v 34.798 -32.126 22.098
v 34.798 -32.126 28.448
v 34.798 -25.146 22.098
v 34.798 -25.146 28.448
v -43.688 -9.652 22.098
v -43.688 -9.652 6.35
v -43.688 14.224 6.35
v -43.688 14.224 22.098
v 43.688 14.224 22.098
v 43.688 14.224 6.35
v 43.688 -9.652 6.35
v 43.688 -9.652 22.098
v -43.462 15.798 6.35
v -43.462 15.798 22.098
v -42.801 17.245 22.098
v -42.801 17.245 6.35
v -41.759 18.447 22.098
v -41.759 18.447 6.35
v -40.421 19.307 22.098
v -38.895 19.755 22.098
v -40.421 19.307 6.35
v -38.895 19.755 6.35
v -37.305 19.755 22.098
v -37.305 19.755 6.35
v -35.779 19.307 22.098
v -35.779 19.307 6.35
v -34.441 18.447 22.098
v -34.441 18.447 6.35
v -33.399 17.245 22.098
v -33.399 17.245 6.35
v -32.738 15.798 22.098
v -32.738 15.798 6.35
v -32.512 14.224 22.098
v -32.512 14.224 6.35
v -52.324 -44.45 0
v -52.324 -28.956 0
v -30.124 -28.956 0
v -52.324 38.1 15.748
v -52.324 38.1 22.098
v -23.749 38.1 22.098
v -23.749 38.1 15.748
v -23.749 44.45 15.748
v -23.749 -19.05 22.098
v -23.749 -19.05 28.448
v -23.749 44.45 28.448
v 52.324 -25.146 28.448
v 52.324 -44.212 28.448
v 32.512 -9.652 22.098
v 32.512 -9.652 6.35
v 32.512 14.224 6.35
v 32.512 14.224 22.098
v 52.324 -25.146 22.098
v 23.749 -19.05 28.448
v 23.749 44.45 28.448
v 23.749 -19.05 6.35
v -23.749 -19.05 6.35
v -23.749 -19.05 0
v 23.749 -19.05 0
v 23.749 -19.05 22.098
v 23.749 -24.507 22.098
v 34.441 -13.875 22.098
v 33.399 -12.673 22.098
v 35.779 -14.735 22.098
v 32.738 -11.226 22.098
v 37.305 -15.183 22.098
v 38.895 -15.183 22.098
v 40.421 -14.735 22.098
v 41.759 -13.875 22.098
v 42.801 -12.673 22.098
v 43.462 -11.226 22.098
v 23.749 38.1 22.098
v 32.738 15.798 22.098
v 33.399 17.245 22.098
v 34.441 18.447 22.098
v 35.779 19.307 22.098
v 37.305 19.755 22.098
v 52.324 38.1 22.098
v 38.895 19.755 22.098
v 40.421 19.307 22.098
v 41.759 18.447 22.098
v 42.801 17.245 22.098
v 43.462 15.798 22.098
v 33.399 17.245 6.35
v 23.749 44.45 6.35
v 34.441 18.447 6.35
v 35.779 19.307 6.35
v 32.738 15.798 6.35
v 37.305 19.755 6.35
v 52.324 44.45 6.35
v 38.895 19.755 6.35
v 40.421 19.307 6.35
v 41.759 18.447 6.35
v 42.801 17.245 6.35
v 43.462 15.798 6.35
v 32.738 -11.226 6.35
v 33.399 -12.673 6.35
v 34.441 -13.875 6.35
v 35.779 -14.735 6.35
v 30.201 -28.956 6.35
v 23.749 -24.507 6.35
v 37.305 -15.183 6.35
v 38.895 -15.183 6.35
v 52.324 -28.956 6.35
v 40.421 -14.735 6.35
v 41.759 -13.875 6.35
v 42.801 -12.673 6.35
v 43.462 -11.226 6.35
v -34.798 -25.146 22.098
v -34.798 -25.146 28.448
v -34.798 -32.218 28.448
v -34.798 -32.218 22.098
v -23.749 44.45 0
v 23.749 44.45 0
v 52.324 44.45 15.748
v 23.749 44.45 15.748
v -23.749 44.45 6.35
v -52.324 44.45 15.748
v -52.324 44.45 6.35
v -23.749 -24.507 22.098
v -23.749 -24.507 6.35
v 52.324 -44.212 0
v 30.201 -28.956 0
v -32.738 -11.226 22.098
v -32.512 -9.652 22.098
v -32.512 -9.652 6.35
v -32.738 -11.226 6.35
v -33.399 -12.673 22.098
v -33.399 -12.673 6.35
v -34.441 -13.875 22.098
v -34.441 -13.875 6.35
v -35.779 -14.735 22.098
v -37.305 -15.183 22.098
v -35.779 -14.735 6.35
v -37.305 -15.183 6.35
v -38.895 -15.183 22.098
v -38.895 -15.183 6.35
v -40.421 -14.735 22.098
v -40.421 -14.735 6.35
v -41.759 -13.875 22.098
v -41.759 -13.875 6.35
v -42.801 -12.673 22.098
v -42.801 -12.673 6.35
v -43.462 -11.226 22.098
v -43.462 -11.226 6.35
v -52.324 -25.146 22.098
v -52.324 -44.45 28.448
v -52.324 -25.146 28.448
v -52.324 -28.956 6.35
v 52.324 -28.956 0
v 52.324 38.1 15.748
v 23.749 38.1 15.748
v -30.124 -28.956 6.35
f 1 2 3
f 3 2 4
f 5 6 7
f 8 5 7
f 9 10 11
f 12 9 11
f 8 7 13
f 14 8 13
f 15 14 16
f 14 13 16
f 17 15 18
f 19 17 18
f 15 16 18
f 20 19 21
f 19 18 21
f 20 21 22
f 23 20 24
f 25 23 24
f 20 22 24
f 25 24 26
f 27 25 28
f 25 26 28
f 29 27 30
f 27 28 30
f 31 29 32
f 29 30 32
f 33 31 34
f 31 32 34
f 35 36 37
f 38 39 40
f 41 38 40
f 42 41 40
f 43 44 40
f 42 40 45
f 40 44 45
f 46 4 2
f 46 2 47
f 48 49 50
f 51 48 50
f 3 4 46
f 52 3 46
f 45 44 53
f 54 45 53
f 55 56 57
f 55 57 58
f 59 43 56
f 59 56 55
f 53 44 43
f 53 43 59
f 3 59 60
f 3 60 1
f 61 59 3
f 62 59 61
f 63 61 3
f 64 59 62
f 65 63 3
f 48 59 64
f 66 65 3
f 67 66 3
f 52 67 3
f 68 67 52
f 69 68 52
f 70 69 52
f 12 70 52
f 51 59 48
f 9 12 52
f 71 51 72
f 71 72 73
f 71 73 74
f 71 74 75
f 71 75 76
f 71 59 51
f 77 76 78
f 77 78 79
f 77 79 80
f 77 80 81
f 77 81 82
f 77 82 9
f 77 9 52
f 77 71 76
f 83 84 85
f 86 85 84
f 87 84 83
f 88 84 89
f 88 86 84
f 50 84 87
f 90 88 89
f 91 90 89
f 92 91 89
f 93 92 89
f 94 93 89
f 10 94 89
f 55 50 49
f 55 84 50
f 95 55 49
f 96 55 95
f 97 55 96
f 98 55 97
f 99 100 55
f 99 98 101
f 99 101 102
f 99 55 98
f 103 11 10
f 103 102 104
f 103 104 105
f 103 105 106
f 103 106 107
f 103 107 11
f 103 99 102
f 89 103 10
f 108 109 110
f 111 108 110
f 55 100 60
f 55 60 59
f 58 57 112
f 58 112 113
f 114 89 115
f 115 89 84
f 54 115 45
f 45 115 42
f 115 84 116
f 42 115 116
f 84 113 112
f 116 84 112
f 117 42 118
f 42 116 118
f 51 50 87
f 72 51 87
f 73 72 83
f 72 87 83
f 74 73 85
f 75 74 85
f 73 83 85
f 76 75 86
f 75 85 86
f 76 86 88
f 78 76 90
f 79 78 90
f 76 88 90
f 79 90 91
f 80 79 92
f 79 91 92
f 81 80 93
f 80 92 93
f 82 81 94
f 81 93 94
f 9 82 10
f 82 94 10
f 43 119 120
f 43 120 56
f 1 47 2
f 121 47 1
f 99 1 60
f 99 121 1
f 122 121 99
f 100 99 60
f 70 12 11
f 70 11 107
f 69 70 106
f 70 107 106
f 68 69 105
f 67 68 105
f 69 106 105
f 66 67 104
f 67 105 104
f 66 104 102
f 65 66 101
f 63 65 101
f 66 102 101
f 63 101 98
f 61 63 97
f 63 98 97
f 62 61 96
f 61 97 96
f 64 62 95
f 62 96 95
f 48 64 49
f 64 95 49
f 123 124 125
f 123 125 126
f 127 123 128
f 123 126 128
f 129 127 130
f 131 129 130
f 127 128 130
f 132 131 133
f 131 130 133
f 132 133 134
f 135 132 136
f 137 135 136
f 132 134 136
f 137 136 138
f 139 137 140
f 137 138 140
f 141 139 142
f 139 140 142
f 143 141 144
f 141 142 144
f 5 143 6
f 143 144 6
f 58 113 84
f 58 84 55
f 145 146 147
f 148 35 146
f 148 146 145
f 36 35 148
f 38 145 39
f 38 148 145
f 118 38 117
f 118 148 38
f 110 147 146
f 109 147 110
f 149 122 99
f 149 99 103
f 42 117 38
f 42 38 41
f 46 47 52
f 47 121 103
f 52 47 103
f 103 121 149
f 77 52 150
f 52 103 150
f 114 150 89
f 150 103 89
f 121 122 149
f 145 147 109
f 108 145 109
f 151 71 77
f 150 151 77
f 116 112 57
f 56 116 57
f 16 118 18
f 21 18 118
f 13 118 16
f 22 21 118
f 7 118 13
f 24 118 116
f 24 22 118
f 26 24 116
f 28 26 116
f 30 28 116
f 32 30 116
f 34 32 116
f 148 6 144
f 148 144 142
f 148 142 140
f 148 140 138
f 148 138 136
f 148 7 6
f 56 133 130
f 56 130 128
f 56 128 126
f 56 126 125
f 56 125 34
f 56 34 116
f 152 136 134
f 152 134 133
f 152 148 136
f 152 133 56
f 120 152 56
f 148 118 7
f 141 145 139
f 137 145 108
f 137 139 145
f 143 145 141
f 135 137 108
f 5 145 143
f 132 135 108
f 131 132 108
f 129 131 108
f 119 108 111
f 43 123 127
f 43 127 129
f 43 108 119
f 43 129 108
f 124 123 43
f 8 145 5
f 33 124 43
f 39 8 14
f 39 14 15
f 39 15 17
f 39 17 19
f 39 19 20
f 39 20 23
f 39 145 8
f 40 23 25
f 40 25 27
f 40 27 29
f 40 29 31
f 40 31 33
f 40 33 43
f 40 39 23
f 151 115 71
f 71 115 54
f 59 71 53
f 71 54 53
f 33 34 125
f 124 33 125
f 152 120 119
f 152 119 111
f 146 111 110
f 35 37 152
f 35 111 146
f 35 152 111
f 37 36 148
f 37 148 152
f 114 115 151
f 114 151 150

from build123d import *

# Parameters (mm, degrees)
F0_W      = 28.575
F0_H      = 88.9
F0_W_2    = 47.498
F1_DEPTH  = 28.448
F2_DEPTH  = 25.4
F3_W      = 28.575
F3_H      = 73.406
F4_DEPTH  = 6.35
F5_W      = 28.575
F5_H      = 6.35
F6_DEPTH  = 6.35
F7_DEPTH  = 12.7
F8_W      = 47.498
F8_H      = 25.4
F9_DEPTH  = 28.449
F11_DEPTH = 28.449


with BuildPart() as f1:
    # F0 (on Top) → F1 (new body)
    with BuildSketch(Plane.XY):
        with Locations((-38.0365, 0)):
            Rectangle(F0_W, F0_H)
        with BuildLine():
            ThreePointArc((-43.688, 14.224), (-38.1, 19.812), (-32.512, 14.224))
            Line((-32.512, 14.224), (-32.512, -9.652))
            ThreePointArc((-32.512, -9.652), (-38.1, -15.24), (-43.688, -9.652))
            Line((-43.688, -9.652), (-43.688, 14.224))
        make_face(mode=Mode.SUBTRACT)
        Rectangle(F0_W_2, F0_H)
        with Locations((38.0365, 0)):
            Rectangle(F0_W, F0_H)
        with BuildLine():
            ThreePointArc((32.512, 14.224), (38.1, 19.812), (43.688, 14.224))
            Line((43.688, 14.224), (43.688, -9.652))
            ThreePointArc((43.688, -9.652), (38.1, -15.24), (32.512, -9.652))
            Line((32.512, -9.652), (32.512, 14.224))
        make_face(mode=Mode.SUBTRACT)
    extrude(amount=F1_DEPTH)

    # F0 (on Top) → F2 (join)
    with BuildSketch(Plane.XY):
        with Locations((-38.0365, 0)):
            Rectangle(F0_W, F0_H)
        with BuildLine():
            ThreePointArc((-43.688, 14.224), (-38.1, 19.812), (-32.512, 14.224))
            Line((-32.512, 14.224), (-32.512, -9.652))
            ThreePointArc((-32.512, -9.652), (-38.1, -15.24), (-43.688, -9.652))
            Line((-43.688, -9.652), (-43.688, 14.224))
        make_face(mode=Mode.SUBTRACT)
        Rectangle(F0_W_2, F0_H)
        with Locations((38.0365, 0)):
            Rectangle(F0_W, F0_H)
        with BuildLine():
            ThreePointArc((32.512, 14.224), (38.1, 19.812), (43.688, 14.224))
            Line((43.688, 14.224), (43.688, -9.652))
            ThreePointArc((43.688, -9.652), (38.1, -15.24), (32.512, -9.652))
            Line((32.512, -9.652), (32.512, 14.224))
        make_face(mode=Mode.SUBTRACT)
    extrude(amount=F2_DEPTH)

    # F3 (on face) → F4 (cut)
    with BuildSketch(Plane(origin=(0, 0, 0), x_dir=(1, 0, 0), z_dir=(0, 0, -1))):
        with Locations((38.0365, -7.747)):
            Rectangle(F3_W, F3_H)
        with BuildLine():
            ThreePointArc((43.688, -14.224), (38.1, -19.812), (32.512, -14.224))
            Line((32.512, -14.224), (32.512, 9.652))
            ThreePointArc((32.512, 9.652), (38.1, 15.24), (43.688, 9.652))
            Line((43.688, 9.652), (43.688, -14.224))
        make_face(mode=Mode.SUBTRACT)
        with Locations((-38.0365, -7.747)):
            Rectangle(F3_W, F3_H)
        with BuildLine():
            Line((-32.512, 9.652), (-32.512, -14.224))
            ThreePointArc((-32.512, -14.224), (-38.1, -19.812), (-43.688, -14.224))
            Line((-43.688, -14.224), (-43.688, 9.652))
            ThreePointArc((-43.688, 9.652), (-38.1, 15.24), (-32.512, 9.652))
        make_face(mode=Mode.SUBTRACT)
    extrude(amount=-F4_DEPTH, mode=Mode.SUBTRACT)

    # F5 (on face) → F6 (cut)
    with BuildSketch(Plane.XY.offset(28.448)):
        with Locations((38.0365, 41.275)):
            Rectangle(F5_W, F5_H)
        Polygon((-23.749, 38.1), (-52.324, 38.1), (-52.324, -25.146), (-34.798, -25.146), (-34.798, -44.45), (-23.749, -44.45), align=None)
        with BuildLine():
            Line((-43.688, -9.652), (-43.688, 14.224))
            ThreePointArc((-43.688, 14.224), (-38.1, 19.812), (-32.512, 14.224))
            Line((-32.512, 14.224), (-32.512, -9.652))
            ThreePointArc((-32.512, -9.652), (-38.1, -15.24), (-43.688, -9.652))
        make_face(mode=Mode.SUBTRACT)
        with Locations((-38.0365, 41.275)):
            Rectangle(F5_W, F5_H)
        Polygon((52.324, 38.1), (23.749, 38.1), (23.749, -44.45), (34.798, -44.45), (34.798, -25.146), (52.324, -25.146), align=None)
        with BuildLine():
            ThreePointArc((43.688, -9.652), (38.1, -15.24), (32.512, -9.652))
            Line((32.512, -9.652), (32.512, 14.224))
            ThreePointArc((32.512, 14.224), (38.1, 19.812), (43.688, 14.224))
            Line((43.688, 14.224), (43.688, -9.652))
        make_face(mode=Mode.SUBTRACT)
    extrude(amount=-F6_DEPTH, mode=Mode.SUBTRACT)

    # F5 (on face) → F7 (cut)
    with BuildSketch(Plane.XY.offset(28.448)):
        with Locations((-38.0365, 41.275)):
            Rectangle(F5_W, F5_H)
        with Locations((38.0365, 41.275)):
            Rectangle(F5_W, F5_H)
    extrude(amount=-F7_DEPTH, mode=Mode.SUBTRACT)

    # F8 (on face) → F9 (cut, through all)
    with BuildSketch(Plane.XY.offset(28.448)):
        with Locations((0, -31.75)):
            Rectangle(F8_W, F8_H)
    extrude(amount=-F9_DEPTH, mode=Mode.SUBTRACT)

    # F10 (on face) → F11 (cut, through all)
    with BuildSketch(Plane.XY):
        Polygon((-23.749, -24.506965), (-52.324, -44.45), (-23.749, -44.45), align=None)
        Polygon((23.749, -44.45), (52.668778, -44.45), (23.749, -24.506965), align=None)
    extrude(amount=F11_DEPTH, mode=Mode.SUBTRACT)


solid = f1.part
